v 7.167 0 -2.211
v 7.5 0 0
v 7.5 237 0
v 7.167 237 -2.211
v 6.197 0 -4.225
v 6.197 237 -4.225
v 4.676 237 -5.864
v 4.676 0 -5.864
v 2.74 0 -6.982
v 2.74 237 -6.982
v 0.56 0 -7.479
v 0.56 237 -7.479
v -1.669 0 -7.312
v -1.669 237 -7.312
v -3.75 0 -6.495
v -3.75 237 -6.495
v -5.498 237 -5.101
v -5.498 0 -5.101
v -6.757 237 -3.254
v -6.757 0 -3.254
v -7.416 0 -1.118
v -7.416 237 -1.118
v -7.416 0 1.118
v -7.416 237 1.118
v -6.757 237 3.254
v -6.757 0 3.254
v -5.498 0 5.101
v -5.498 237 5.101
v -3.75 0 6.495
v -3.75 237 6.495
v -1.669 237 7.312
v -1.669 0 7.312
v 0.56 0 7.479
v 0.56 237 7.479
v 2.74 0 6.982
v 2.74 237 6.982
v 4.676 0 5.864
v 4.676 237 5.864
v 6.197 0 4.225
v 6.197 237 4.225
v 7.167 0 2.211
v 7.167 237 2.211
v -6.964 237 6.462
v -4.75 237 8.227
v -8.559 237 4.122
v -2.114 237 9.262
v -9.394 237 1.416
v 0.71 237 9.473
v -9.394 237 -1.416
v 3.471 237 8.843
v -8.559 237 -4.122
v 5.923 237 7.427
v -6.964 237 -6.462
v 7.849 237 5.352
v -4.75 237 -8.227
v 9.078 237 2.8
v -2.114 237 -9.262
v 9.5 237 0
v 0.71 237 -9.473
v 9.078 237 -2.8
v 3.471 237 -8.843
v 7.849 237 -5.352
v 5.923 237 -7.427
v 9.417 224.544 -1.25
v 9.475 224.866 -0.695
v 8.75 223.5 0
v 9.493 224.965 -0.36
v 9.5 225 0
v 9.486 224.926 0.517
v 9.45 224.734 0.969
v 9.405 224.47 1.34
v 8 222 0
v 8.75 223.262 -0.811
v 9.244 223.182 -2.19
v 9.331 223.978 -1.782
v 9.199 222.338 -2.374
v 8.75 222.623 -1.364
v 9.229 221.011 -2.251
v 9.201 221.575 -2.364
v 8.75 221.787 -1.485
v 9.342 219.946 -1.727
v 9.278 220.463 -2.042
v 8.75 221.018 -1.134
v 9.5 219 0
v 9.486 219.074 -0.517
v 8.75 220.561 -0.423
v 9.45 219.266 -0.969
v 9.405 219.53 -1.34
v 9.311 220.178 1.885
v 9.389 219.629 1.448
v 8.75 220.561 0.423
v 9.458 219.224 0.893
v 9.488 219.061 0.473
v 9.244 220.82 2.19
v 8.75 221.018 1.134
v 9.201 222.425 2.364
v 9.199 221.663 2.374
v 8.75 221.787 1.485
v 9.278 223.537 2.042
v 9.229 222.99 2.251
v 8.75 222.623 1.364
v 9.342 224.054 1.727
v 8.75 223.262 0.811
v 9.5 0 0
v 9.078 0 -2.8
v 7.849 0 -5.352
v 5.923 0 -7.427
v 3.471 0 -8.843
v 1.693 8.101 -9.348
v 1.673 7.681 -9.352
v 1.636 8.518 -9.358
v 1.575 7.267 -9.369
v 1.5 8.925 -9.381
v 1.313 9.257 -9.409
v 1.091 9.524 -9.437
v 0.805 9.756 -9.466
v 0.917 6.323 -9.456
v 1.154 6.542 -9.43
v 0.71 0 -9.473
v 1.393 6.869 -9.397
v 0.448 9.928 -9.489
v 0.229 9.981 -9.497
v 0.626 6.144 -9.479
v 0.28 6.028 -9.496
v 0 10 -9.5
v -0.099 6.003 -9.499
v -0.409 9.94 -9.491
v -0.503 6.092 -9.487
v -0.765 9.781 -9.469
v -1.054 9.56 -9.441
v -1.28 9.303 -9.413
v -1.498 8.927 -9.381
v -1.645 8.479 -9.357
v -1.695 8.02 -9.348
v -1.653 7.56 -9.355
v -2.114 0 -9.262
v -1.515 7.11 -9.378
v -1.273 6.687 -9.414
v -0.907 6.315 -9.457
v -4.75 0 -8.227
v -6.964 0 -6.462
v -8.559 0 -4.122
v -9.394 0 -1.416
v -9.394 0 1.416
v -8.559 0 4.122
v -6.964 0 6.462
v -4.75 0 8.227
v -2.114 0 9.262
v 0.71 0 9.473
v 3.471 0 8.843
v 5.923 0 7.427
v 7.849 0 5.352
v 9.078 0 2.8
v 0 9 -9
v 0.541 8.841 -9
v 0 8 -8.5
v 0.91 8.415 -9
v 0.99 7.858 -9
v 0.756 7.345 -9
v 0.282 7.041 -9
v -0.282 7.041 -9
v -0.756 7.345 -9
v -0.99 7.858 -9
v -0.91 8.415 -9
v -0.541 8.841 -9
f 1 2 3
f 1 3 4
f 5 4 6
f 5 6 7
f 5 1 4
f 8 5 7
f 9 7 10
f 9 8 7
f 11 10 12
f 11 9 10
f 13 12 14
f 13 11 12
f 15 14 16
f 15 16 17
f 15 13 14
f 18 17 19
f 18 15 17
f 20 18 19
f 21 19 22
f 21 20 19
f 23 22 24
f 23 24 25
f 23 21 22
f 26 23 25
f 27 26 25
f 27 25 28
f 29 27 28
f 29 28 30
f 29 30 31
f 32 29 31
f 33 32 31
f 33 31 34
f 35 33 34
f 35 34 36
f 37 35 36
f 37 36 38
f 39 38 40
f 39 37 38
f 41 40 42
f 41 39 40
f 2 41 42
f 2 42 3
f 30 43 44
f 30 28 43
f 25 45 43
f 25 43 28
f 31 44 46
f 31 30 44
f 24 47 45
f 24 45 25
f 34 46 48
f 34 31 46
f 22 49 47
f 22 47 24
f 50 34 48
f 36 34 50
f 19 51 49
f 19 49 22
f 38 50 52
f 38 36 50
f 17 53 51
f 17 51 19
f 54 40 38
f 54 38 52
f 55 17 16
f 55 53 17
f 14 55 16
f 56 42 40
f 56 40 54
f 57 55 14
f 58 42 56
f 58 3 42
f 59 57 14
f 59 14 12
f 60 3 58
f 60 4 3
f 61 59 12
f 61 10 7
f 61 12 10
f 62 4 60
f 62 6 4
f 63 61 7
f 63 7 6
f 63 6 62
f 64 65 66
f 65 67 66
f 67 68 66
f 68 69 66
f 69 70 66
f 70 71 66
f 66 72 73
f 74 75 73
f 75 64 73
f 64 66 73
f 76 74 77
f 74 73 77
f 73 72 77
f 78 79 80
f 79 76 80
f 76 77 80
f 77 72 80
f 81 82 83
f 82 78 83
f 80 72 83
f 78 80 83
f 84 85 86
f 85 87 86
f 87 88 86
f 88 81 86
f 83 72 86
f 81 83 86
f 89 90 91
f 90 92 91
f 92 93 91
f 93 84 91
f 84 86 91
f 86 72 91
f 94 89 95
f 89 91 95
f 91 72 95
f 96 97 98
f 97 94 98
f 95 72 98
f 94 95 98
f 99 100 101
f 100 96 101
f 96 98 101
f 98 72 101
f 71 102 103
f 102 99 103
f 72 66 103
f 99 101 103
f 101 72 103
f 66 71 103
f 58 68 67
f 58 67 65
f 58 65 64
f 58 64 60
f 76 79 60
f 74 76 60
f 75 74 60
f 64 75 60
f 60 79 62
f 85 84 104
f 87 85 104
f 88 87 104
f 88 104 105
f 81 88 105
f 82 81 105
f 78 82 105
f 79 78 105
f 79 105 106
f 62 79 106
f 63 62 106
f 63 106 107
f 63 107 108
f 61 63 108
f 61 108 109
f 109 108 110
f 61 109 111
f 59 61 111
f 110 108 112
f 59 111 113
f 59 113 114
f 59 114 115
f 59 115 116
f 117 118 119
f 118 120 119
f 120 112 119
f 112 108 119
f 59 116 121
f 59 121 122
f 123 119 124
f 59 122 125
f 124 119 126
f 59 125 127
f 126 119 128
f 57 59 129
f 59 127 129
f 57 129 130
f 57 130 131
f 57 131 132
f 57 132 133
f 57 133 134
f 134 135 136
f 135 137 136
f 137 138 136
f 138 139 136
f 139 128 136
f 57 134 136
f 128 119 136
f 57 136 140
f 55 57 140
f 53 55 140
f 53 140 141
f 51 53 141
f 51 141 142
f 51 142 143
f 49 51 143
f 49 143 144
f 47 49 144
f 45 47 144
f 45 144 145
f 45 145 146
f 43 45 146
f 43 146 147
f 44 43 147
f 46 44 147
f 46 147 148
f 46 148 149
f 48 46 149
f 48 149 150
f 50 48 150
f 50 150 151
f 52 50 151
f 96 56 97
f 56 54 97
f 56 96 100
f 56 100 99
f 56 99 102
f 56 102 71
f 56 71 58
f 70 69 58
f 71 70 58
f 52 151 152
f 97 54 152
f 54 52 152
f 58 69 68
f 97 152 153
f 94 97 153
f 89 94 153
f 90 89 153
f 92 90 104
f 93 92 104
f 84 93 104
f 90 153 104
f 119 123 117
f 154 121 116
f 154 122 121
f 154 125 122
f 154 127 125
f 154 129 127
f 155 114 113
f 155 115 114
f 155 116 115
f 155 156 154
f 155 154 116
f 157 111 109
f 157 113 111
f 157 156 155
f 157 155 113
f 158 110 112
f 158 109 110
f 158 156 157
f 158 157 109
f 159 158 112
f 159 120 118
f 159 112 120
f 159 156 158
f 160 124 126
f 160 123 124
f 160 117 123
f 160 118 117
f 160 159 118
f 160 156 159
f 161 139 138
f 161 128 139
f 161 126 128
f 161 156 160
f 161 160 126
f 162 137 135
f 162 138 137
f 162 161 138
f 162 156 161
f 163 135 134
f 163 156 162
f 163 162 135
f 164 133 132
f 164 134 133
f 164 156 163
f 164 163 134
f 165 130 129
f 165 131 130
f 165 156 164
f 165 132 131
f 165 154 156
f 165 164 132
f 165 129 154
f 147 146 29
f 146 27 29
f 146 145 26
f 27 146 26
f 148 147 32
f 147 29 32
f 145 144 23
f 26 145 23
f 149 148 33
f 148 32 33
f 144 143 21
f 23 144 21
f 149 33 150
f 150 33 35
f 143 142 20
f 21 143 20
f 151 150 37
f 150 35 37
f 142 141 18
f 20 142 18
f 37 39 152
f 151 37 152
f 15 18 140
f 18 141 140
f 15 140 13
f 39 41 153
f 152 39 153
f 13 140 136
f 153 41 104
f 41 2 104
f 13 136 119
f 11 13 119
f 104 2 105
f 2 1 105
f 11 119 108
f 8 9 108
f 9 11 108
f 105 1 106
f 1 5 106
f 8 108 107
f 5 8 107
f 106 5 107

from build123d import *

# Parameters (mm, degrees)
SKETCH1_R           = 9.5
SKETCH1_R_2         = 7.5
EXTRUDE_THIN1_DEPTH = 237


with BuildPart() as part:
    # Sketch1 → Extrude-Thin1 (new body)
    with BuildSketch(Plane(origin=(0, 0, 0), x_dir=(1, 0, 0), z_dir=(0, 1, 0))):
        Circle(SKETCH1_R)
        Circle(SKETCH1_R_2, mode=Mode.SUBTRACT)
    extrude(amount=EXTRUDE_THIN1_DEPTH)

    # Sketch6 → Cut-Revolve1 (revolve, cut)
    with BuildSketch(Plane(origin=(0, 0, 0), x_dir=(0, 0, -1), z_dir=(1, 0, 0))):
        Polygon((8.5, 8), (9.5, 8), (9.5, 10), align=None)
    revolve(axis=Axis((0, 8, -0.902354342), (0, 0, -1)), mode=Mode.SUBTRACT)

    # Sketch10 → Cut-Revolve3 (revolve, cut)
    with BuildSketch(Plane.XY):
        Polygon((9.5, 222), (9.5, 225), (8, 222), align=None)
    revolve(axis=Axis((18.348289419, 222, 0), (-1, 0, 0)), mode=Mode.SUBTRACT)


solid = part.part
